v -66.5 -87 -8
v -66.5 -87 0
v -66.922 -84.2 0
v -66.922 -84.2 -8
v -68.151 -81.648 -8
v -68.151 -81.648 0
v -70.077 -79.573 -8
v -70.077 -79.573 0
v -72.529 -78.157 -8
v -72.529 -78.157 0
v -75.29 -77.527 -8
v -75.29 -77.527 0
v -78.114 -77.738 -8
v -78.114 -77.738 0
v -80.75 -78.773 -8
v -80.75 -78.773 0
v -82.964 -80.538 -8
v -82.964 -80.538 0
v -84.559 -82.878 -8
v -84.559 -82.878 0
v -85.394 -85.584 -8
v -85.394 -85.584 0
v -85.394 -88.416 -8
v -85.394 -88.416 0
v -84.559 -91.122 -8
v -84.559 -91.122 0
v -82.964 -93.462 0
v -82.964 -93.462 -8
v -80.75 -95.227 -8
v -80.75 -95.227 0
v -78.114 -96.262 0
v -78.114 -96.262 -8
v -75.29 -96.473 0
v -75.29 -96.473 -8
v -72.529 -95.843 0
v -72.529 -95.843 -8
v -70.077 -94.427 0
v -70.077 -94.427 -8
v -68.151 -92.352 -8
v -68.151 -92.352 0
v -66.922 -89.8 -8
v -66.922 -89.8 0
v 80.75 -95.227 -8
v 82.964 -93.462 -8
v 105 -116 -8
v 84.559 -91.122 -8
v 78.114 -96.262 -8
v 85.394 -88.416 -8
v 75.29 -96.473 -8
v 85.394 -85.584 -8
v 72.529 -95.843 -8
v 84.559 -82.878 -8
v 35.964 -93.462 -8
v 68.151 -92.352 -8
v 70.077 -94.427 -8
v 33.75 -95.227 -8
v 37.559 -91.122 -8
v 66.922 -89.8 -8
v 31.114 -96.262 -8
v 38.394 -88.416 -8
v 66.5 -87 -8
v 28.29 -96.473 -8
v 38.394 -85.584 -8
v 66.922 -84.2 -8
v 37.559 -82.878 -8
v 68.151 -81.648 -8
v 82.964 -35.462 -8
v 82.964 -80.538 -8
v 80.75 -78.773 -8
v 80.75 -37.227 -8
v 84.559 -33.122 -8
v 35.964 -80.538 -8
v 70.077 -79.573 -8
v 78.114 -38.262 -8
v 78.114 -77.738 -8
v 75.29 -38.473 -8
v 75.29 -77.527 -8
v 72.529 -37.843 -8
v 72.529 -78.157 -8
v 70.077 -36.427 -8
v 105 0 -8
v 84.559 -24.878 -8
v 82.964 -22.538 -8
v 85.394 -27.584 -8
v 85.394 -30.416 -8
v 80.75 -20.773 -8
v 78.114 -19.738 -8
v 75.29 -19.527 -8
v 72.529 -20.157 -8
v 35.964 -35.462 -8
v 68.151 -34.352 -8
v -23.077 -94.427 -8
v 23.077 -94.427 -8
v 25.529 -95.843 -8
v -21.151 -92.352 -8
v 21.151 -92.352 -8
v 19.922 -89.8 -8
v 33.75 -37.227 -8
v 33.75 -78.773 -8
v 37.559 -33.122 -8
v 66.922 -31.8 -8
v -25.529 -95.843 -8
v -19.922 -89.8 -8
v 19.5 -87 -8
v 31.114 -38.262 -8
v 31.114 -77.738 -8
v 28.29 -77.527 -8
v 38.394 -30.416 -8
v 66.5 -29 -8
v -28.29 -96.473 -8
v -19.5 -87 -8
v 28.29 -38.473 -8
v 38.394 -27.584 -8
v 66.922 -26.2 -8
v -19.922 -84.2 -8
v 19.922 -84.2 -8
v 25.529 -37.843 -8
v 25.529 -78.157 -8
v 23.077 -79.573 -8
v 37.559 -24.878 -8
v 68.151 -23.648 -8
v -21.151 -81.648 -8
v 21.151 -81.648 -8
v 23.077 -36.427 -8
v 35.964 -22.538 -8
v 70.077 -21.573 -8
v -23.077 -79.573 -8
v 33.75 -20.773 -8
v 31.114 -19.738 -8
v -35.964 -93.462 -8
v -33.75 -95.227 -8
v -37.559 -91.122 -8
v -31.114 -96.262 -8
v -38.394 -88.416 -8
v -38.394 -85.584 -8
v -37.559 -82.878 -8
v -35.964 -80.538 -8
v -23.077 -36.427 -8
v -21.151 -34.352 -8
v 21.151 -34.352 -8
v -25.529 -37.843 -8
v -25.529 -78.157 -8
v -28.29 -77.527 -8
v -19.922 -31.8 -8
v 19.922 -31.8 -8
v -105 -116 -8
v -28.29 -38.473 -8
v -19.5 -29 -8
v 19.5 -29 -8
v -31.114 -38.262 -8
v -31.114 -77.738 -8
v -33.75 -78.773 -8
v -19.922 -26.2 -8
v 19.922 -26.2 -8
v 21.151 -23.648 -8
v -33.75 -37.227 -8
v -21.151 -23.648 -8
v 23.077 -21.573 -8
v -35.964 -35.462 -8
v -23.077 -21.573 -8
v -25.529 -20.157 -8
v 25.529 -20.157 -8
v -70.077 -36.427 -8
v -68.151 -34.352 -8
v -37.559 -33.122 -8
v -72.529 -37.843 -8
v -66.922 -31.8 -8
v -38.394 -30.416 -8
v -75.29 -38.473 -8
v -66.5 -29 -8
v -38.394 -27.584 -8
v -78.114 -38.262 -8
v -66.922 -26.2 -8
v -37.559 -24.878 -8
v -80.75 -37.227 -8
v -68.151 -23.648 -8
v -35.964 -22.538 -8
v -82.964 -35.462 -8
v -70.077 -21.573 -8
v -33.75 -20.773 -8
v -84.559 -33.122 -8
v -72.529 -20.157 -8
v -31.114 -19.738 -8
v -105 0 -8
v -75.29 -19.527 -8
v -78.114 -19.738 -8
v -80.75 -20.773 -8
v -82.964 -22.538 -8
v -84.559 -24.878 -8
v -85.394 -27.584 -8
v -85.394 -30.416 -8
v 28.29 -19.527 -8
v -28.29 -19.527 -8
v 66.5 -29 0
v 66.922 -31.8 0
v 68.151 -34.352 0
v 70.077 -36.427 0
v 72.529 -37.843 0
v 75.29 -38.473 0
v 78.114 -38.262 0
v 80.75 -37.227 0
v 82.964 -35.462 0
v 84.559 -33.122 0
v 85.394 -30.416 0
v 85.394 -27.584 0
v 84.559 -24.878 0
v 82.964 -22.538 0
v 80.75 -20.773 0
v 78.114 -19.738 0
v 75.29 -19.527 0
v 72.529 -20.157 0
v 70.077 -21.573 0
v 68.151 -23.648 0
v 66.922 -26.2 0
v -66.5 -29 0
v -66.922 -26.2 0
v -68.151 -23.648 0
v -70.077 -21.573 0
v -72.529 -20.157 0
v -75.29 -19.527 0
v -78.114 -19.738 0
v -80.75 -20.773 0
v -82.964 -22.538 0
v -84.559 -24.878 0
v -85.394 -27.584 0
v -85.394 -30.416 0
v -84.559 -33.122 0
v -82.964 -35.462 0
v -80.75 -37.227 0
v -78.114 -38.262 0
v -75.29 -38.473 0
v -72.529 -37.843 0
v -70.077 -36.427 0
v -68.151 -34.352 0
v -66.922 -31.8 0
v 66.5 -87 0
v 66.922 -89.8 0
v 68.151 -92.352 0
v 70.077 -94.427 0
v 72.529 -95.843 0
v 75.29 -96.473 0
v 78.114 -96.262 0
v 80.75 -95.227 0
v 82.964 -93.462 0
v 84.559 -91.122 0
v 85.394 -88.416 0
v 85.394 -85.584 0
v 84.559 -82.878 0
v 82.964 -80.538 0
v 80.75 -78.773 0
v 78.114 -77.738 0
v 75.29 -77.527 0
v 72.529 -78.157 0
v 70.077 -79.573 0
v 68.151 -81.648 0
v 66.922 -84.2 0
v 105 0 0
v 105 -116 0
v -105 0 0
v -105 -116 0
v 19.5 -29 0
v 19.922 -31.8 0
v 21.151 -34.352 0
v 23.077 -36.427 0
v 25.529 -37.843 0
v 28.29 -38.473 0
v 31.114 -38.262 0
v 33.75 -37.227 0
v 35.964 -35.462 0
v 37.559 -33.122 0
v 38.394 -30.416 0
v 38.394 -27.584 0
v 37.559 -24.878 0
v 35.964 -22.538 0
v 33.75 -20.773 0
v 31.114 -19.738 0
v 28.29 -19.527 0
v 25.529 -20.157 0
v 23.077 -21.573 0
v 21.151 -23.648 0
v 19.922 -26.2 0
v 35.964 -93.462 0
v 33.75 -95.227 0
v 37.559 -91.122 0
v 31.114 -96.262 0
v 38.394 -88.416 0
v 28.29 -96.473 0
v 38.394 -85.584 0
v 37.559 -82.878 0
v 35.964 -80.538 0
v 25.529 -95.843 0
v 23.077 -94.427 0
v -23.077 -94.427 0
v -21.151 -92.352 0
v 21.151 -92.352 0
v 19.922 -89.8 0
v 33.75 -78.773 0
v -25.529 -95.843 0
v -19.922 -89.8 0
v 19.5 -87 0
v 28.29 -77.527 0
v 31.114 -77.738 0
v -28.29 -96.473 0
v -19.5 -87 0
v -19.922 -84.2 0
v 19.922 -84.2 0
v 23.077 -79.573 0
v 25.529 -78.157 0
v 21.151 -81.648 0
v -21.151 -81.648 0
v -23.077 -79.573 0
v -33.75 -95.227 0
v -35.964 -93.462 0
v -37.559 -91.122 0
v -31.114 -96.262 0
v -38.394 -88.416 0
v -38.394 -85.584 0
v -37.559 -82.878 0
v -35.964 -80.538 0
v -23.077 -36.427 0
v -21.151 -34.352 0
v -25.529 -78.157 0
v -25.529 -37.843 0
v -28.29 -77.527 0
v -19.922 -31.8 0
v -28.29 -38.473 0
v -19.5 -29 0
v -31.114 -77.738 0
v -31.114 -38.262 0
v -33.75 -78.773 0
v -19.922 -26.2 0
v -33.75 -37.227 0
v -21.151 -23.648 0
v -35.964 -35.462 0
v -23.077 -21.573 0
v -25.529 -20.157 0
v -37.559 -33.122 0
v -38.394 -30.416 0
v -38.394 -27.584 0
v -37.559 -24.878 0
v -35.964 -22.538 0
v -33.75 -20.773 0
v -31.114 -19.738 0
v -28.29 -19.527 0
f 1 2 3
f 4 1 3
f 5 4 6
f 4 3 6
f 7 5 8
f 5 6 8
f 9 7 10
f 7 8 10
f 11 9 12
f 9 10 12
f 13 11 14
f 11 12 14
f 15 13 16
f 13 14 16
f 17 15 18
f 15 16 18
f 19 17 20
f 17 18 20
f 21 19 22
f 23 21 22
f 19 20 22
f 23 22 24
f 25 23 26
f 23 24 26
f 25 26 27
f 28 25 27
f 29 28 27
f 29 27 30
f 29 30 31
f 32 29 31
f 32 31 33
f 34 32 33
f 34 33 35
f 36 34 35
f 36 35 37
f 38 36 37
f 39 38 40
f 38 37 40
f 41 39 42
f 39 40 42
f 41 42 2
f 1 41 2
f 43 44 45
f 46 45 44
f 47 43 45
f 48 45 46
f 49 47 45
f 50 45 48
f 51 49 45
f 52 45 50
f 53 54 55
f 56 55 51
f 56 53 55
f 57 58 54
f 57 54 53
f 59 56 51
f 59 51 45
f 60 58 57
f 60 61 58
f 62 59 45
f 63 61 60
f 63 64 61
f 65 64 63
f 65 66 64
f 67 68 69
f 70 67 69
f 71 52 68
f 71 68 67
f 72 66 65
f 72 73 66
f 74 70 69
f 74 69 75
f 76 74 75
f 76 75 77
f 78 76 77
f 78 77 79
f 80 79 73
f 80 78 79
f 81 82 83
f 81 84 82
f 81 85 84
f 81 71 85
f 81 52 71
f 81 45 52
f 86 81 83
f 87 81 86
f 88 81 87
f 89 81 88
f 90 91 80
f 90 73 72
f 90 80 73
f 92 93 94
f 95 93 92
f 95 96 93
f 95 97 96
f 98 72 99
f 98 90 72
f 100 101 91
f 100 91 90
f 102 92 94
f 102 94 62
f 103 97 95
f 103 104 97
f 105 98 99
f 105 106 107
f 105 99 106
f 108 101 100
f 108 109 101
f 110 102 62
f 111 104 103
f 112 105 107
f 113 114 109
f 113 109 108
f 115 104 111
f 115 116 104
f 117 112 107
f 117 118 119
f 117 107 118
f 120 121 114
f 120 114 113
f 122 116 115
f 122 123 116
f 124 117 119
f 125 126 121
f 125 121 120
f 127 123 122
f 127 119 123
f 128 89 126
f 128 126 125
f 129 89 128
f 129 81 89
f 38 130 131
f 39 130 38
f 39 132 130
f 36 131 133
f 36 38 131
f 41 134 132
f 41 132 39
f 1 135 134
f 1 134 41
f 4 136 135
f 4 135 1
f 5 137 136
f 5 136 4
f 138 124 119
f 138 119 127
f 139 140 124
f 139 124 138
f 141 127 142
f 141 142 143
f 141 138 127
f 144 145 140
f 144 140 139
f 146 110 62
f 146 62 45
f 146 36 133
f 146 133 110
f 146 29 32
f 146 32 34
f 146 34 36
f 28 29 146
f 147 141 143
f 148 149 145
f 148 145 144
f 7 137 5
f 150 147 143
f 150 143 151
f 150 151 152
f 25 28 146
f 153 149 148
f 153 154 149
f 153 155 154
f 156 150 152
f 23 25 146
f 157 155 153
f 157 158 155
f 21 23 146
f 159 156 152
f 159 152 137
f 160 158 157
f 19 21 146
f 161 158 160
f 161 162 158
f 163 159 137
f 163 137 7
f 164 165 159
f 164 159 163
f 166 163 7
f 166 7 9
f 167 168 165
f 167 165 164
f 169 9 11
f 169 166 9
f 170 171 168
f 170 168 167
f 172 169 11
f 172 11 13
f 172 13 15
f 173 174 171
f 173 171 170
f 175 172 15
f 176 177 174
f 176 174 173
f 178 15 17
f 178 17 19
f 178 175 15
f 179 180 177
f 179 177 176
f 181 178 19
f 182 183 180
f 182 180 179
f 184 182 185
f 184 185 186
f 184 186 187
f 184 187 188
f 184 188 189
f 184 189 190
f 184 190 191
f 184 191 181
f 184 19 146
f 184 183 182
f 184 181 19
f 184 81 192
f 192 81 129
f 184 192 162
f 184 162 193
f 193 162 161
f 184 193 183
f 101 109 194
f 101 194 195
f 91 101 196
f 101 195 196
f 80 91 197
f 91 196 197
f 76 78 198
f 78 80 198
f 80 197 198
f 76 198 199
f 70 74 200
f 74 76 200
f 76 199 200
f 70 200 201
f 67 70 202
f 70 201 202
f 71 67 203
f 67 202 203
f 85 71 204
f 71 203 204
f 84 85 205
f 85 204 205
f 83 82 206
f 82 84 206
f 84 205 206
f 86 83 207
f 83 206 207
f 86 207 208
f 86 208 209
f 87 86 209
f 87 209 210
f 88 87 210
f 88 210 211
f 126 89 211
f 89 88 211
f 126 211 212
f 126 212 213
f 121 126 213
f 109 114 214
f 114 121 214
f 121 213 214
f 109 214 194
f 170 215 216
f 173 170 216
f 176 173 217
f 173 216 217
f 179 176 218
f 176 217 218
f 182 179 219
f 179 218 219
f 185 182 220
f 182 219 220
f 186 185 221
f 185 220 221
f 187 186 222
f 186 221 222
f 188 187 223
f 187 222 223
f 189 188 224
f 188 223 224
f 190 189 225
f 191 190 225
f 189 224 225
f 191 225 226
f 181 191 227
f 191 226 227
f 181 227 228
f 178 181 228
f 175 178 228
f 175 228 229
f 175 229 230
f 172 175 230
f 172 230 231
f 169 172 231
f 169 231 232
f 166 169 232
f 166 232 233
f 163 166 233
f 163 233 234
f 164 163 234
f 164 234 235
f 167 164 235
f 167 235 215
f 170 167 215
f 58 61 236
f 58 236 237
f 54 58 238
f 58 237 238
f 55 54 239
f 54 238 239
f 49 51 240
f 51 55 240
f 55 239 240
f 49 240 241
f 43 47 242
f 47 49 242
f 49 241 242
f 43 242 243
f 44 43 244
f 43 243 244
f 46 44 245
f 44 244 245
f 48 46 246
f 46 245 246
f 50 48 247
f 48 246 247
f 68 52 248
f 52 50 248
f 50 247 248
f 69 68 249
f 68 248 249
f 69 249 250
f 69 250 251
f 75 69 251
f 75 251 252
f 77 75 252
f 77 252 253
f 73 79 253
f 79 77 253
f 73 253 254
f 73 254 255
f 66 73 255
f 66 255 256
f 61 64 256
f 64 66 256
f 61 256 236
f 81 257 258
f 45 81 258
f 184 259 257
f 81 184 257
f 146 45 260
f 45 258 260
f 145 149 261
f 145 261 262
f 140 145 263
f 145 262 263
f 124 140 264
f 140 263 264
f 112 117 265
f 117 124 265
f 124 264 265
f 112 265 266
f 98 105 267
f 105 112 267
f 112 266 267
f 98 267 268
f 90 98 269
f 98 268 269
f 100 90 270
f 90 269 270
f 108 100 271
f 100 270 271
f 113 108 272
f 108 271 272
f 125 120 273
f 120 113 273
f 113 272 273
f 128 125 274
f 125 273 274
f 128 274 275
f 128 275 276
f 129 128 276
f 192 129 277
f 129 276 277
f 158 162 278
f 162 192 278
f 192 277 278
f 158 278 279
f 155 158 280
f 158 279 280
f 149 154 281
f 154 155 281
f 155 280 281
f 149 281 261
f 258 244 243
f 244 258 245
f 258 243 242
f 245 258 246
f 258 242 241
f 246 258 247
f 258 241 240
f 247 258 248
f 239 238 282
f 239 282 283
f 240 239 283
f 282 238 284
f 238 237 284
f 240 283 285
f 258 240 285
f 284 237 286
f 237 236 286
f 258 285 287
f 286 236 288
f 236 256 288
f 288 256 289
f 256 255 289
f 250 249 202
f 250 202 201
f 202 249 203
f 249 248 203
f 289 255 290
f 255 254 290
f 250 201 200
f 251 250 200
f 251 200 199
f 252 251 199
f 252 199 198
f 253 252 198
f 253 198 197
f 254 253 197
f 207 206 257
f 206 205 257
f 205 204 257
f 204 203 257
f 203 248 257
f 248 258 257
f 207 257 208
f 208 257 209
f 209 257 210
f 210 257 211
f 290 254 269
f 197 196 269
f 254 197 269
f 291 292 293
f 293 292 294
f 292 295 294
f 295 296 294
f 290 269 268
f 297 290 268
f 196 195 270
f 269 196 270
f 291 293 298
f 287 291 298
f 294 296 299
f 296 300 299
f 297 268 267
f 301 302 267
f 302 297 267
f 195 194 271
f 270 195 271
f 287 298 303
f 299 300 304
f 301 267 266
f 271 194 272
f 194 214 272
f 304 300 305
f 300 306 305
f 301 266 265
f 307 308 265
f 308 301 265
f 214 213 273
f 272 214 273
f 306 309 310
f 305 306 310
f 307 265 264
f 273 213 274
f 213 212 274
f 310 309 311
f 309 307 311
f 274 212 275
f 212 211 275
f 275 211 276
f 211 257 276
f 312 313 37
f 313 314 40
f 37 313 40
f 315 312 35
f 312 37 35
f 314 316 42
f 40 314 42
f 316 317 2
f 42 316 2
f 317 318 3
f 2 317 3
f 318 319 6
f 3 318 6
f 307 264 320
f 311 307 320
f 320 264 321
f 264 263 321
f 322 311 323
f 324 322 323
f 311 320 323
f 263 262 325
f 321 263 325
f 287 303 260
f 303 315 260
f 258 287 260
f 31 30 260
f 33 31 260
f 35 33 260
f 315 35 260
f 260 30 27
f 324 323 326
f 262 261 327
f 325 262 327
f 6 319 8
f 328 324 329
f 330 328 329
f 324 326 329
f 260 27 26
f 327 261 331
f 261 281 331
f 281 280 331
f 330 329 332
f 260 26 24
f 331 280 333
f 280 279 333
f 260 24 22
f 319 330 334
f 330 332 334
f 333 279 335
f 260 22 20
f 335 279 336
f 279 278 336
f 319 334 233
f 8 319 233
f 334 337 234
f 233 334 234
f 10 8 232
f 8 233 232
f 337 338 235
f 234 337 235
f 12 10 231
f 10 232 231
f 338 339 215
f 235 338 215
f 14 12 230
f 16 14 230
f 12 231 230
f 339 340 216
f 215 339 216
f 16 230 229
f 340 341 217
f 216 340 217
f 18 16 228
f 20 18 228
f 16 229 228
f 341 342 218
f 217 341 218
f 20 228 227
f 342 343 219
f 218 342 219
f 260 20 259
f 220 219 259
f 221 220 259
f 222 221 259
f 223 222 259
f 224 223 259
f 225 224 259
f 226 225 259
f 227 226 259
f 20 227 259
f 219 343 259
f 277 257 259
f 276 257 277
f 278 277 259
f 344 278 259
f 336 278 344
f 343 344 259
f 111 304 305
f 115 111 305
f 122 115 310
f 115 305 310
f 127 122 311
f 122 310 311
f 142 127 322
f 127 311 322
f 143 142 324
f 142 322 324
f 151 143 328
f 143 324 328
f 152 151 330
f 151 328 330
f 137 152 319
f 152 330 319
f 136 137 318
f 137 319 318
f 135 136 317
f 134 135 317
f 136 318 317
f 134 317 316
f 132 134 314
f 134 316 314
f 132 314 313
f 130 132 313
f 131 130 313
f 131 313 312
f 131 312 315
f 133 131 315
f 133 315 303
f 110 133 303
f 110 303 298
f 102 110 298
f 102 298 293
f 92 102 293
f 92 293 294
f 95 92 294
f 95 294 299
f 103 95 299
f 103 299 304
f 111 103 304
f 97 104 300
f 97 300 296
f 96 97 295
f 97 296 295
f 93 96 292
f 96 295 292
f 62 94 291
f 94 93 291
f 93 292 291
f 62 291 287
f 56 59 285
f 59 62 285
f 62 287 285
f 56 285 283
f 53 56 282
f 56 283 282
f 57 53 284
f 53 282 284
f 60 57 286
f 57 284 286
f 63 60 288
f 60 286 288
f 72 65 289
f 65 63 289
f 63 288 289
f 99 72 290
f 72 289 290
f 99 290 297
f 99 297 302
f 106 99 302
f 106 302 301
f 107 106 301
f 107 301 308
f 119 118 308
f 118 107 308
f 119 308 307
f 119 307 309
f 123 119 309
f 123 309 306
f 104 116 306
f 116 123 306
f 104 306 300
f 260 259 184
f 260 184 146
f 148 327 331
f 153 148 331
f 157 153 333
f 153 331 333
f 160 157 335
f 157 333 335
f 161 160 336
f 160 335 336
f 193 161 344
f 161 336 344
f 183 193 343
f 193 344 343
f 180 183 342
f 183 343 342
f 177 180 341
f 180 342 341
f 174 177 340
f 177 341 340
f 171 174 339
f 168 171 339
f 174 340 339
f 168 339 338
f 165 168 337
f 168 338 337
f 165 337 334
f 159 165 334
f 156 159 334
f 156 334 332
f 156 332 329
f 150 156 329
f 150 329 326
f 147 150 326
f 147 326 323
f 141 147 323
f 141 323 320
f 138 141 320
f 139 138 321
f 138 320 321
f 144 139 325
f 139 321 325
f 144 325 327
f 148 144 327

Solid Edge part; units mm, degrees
sketch "Sketch1" plane through (0, 0, 0) normal (0, 0, 1) x (1, 0, 0)
  line L0 (105, -116) -> (0, -116)
  line L1 (-105, -116) -> (0, -116)
  line L2 (-105, 0) -> (-105, -116)
  line L3 (0, 0) -> (-105, 0)
  line L4 (0, 0) -> (105, 0)
  line L5 (105, 0) -> (105, -116)
extrude "Protrusion1" add sketch "Sketch1" against normal blind 8
sketch "Sketch2" plane through (0, -58, 0) normal (0, 0, 1) x (1, 0, 0)
  circle A0 centre (-29, 29) radius 9.5
extrude "ExtrudedCutout_2" cut sketch "Sketch2" against normal blind 8
pattern_linear "Pattern1" count 2 spacing 47 along (-1, 0, 0) count 2 spacing 58 along (0, -1, 0) of "ExtrudedCutout_2"
mirror "Mirror1" about plane through (0, -58, -4) normal (-1, 0, 0) of "ExtrudedCutout_2", "Pattern1"
